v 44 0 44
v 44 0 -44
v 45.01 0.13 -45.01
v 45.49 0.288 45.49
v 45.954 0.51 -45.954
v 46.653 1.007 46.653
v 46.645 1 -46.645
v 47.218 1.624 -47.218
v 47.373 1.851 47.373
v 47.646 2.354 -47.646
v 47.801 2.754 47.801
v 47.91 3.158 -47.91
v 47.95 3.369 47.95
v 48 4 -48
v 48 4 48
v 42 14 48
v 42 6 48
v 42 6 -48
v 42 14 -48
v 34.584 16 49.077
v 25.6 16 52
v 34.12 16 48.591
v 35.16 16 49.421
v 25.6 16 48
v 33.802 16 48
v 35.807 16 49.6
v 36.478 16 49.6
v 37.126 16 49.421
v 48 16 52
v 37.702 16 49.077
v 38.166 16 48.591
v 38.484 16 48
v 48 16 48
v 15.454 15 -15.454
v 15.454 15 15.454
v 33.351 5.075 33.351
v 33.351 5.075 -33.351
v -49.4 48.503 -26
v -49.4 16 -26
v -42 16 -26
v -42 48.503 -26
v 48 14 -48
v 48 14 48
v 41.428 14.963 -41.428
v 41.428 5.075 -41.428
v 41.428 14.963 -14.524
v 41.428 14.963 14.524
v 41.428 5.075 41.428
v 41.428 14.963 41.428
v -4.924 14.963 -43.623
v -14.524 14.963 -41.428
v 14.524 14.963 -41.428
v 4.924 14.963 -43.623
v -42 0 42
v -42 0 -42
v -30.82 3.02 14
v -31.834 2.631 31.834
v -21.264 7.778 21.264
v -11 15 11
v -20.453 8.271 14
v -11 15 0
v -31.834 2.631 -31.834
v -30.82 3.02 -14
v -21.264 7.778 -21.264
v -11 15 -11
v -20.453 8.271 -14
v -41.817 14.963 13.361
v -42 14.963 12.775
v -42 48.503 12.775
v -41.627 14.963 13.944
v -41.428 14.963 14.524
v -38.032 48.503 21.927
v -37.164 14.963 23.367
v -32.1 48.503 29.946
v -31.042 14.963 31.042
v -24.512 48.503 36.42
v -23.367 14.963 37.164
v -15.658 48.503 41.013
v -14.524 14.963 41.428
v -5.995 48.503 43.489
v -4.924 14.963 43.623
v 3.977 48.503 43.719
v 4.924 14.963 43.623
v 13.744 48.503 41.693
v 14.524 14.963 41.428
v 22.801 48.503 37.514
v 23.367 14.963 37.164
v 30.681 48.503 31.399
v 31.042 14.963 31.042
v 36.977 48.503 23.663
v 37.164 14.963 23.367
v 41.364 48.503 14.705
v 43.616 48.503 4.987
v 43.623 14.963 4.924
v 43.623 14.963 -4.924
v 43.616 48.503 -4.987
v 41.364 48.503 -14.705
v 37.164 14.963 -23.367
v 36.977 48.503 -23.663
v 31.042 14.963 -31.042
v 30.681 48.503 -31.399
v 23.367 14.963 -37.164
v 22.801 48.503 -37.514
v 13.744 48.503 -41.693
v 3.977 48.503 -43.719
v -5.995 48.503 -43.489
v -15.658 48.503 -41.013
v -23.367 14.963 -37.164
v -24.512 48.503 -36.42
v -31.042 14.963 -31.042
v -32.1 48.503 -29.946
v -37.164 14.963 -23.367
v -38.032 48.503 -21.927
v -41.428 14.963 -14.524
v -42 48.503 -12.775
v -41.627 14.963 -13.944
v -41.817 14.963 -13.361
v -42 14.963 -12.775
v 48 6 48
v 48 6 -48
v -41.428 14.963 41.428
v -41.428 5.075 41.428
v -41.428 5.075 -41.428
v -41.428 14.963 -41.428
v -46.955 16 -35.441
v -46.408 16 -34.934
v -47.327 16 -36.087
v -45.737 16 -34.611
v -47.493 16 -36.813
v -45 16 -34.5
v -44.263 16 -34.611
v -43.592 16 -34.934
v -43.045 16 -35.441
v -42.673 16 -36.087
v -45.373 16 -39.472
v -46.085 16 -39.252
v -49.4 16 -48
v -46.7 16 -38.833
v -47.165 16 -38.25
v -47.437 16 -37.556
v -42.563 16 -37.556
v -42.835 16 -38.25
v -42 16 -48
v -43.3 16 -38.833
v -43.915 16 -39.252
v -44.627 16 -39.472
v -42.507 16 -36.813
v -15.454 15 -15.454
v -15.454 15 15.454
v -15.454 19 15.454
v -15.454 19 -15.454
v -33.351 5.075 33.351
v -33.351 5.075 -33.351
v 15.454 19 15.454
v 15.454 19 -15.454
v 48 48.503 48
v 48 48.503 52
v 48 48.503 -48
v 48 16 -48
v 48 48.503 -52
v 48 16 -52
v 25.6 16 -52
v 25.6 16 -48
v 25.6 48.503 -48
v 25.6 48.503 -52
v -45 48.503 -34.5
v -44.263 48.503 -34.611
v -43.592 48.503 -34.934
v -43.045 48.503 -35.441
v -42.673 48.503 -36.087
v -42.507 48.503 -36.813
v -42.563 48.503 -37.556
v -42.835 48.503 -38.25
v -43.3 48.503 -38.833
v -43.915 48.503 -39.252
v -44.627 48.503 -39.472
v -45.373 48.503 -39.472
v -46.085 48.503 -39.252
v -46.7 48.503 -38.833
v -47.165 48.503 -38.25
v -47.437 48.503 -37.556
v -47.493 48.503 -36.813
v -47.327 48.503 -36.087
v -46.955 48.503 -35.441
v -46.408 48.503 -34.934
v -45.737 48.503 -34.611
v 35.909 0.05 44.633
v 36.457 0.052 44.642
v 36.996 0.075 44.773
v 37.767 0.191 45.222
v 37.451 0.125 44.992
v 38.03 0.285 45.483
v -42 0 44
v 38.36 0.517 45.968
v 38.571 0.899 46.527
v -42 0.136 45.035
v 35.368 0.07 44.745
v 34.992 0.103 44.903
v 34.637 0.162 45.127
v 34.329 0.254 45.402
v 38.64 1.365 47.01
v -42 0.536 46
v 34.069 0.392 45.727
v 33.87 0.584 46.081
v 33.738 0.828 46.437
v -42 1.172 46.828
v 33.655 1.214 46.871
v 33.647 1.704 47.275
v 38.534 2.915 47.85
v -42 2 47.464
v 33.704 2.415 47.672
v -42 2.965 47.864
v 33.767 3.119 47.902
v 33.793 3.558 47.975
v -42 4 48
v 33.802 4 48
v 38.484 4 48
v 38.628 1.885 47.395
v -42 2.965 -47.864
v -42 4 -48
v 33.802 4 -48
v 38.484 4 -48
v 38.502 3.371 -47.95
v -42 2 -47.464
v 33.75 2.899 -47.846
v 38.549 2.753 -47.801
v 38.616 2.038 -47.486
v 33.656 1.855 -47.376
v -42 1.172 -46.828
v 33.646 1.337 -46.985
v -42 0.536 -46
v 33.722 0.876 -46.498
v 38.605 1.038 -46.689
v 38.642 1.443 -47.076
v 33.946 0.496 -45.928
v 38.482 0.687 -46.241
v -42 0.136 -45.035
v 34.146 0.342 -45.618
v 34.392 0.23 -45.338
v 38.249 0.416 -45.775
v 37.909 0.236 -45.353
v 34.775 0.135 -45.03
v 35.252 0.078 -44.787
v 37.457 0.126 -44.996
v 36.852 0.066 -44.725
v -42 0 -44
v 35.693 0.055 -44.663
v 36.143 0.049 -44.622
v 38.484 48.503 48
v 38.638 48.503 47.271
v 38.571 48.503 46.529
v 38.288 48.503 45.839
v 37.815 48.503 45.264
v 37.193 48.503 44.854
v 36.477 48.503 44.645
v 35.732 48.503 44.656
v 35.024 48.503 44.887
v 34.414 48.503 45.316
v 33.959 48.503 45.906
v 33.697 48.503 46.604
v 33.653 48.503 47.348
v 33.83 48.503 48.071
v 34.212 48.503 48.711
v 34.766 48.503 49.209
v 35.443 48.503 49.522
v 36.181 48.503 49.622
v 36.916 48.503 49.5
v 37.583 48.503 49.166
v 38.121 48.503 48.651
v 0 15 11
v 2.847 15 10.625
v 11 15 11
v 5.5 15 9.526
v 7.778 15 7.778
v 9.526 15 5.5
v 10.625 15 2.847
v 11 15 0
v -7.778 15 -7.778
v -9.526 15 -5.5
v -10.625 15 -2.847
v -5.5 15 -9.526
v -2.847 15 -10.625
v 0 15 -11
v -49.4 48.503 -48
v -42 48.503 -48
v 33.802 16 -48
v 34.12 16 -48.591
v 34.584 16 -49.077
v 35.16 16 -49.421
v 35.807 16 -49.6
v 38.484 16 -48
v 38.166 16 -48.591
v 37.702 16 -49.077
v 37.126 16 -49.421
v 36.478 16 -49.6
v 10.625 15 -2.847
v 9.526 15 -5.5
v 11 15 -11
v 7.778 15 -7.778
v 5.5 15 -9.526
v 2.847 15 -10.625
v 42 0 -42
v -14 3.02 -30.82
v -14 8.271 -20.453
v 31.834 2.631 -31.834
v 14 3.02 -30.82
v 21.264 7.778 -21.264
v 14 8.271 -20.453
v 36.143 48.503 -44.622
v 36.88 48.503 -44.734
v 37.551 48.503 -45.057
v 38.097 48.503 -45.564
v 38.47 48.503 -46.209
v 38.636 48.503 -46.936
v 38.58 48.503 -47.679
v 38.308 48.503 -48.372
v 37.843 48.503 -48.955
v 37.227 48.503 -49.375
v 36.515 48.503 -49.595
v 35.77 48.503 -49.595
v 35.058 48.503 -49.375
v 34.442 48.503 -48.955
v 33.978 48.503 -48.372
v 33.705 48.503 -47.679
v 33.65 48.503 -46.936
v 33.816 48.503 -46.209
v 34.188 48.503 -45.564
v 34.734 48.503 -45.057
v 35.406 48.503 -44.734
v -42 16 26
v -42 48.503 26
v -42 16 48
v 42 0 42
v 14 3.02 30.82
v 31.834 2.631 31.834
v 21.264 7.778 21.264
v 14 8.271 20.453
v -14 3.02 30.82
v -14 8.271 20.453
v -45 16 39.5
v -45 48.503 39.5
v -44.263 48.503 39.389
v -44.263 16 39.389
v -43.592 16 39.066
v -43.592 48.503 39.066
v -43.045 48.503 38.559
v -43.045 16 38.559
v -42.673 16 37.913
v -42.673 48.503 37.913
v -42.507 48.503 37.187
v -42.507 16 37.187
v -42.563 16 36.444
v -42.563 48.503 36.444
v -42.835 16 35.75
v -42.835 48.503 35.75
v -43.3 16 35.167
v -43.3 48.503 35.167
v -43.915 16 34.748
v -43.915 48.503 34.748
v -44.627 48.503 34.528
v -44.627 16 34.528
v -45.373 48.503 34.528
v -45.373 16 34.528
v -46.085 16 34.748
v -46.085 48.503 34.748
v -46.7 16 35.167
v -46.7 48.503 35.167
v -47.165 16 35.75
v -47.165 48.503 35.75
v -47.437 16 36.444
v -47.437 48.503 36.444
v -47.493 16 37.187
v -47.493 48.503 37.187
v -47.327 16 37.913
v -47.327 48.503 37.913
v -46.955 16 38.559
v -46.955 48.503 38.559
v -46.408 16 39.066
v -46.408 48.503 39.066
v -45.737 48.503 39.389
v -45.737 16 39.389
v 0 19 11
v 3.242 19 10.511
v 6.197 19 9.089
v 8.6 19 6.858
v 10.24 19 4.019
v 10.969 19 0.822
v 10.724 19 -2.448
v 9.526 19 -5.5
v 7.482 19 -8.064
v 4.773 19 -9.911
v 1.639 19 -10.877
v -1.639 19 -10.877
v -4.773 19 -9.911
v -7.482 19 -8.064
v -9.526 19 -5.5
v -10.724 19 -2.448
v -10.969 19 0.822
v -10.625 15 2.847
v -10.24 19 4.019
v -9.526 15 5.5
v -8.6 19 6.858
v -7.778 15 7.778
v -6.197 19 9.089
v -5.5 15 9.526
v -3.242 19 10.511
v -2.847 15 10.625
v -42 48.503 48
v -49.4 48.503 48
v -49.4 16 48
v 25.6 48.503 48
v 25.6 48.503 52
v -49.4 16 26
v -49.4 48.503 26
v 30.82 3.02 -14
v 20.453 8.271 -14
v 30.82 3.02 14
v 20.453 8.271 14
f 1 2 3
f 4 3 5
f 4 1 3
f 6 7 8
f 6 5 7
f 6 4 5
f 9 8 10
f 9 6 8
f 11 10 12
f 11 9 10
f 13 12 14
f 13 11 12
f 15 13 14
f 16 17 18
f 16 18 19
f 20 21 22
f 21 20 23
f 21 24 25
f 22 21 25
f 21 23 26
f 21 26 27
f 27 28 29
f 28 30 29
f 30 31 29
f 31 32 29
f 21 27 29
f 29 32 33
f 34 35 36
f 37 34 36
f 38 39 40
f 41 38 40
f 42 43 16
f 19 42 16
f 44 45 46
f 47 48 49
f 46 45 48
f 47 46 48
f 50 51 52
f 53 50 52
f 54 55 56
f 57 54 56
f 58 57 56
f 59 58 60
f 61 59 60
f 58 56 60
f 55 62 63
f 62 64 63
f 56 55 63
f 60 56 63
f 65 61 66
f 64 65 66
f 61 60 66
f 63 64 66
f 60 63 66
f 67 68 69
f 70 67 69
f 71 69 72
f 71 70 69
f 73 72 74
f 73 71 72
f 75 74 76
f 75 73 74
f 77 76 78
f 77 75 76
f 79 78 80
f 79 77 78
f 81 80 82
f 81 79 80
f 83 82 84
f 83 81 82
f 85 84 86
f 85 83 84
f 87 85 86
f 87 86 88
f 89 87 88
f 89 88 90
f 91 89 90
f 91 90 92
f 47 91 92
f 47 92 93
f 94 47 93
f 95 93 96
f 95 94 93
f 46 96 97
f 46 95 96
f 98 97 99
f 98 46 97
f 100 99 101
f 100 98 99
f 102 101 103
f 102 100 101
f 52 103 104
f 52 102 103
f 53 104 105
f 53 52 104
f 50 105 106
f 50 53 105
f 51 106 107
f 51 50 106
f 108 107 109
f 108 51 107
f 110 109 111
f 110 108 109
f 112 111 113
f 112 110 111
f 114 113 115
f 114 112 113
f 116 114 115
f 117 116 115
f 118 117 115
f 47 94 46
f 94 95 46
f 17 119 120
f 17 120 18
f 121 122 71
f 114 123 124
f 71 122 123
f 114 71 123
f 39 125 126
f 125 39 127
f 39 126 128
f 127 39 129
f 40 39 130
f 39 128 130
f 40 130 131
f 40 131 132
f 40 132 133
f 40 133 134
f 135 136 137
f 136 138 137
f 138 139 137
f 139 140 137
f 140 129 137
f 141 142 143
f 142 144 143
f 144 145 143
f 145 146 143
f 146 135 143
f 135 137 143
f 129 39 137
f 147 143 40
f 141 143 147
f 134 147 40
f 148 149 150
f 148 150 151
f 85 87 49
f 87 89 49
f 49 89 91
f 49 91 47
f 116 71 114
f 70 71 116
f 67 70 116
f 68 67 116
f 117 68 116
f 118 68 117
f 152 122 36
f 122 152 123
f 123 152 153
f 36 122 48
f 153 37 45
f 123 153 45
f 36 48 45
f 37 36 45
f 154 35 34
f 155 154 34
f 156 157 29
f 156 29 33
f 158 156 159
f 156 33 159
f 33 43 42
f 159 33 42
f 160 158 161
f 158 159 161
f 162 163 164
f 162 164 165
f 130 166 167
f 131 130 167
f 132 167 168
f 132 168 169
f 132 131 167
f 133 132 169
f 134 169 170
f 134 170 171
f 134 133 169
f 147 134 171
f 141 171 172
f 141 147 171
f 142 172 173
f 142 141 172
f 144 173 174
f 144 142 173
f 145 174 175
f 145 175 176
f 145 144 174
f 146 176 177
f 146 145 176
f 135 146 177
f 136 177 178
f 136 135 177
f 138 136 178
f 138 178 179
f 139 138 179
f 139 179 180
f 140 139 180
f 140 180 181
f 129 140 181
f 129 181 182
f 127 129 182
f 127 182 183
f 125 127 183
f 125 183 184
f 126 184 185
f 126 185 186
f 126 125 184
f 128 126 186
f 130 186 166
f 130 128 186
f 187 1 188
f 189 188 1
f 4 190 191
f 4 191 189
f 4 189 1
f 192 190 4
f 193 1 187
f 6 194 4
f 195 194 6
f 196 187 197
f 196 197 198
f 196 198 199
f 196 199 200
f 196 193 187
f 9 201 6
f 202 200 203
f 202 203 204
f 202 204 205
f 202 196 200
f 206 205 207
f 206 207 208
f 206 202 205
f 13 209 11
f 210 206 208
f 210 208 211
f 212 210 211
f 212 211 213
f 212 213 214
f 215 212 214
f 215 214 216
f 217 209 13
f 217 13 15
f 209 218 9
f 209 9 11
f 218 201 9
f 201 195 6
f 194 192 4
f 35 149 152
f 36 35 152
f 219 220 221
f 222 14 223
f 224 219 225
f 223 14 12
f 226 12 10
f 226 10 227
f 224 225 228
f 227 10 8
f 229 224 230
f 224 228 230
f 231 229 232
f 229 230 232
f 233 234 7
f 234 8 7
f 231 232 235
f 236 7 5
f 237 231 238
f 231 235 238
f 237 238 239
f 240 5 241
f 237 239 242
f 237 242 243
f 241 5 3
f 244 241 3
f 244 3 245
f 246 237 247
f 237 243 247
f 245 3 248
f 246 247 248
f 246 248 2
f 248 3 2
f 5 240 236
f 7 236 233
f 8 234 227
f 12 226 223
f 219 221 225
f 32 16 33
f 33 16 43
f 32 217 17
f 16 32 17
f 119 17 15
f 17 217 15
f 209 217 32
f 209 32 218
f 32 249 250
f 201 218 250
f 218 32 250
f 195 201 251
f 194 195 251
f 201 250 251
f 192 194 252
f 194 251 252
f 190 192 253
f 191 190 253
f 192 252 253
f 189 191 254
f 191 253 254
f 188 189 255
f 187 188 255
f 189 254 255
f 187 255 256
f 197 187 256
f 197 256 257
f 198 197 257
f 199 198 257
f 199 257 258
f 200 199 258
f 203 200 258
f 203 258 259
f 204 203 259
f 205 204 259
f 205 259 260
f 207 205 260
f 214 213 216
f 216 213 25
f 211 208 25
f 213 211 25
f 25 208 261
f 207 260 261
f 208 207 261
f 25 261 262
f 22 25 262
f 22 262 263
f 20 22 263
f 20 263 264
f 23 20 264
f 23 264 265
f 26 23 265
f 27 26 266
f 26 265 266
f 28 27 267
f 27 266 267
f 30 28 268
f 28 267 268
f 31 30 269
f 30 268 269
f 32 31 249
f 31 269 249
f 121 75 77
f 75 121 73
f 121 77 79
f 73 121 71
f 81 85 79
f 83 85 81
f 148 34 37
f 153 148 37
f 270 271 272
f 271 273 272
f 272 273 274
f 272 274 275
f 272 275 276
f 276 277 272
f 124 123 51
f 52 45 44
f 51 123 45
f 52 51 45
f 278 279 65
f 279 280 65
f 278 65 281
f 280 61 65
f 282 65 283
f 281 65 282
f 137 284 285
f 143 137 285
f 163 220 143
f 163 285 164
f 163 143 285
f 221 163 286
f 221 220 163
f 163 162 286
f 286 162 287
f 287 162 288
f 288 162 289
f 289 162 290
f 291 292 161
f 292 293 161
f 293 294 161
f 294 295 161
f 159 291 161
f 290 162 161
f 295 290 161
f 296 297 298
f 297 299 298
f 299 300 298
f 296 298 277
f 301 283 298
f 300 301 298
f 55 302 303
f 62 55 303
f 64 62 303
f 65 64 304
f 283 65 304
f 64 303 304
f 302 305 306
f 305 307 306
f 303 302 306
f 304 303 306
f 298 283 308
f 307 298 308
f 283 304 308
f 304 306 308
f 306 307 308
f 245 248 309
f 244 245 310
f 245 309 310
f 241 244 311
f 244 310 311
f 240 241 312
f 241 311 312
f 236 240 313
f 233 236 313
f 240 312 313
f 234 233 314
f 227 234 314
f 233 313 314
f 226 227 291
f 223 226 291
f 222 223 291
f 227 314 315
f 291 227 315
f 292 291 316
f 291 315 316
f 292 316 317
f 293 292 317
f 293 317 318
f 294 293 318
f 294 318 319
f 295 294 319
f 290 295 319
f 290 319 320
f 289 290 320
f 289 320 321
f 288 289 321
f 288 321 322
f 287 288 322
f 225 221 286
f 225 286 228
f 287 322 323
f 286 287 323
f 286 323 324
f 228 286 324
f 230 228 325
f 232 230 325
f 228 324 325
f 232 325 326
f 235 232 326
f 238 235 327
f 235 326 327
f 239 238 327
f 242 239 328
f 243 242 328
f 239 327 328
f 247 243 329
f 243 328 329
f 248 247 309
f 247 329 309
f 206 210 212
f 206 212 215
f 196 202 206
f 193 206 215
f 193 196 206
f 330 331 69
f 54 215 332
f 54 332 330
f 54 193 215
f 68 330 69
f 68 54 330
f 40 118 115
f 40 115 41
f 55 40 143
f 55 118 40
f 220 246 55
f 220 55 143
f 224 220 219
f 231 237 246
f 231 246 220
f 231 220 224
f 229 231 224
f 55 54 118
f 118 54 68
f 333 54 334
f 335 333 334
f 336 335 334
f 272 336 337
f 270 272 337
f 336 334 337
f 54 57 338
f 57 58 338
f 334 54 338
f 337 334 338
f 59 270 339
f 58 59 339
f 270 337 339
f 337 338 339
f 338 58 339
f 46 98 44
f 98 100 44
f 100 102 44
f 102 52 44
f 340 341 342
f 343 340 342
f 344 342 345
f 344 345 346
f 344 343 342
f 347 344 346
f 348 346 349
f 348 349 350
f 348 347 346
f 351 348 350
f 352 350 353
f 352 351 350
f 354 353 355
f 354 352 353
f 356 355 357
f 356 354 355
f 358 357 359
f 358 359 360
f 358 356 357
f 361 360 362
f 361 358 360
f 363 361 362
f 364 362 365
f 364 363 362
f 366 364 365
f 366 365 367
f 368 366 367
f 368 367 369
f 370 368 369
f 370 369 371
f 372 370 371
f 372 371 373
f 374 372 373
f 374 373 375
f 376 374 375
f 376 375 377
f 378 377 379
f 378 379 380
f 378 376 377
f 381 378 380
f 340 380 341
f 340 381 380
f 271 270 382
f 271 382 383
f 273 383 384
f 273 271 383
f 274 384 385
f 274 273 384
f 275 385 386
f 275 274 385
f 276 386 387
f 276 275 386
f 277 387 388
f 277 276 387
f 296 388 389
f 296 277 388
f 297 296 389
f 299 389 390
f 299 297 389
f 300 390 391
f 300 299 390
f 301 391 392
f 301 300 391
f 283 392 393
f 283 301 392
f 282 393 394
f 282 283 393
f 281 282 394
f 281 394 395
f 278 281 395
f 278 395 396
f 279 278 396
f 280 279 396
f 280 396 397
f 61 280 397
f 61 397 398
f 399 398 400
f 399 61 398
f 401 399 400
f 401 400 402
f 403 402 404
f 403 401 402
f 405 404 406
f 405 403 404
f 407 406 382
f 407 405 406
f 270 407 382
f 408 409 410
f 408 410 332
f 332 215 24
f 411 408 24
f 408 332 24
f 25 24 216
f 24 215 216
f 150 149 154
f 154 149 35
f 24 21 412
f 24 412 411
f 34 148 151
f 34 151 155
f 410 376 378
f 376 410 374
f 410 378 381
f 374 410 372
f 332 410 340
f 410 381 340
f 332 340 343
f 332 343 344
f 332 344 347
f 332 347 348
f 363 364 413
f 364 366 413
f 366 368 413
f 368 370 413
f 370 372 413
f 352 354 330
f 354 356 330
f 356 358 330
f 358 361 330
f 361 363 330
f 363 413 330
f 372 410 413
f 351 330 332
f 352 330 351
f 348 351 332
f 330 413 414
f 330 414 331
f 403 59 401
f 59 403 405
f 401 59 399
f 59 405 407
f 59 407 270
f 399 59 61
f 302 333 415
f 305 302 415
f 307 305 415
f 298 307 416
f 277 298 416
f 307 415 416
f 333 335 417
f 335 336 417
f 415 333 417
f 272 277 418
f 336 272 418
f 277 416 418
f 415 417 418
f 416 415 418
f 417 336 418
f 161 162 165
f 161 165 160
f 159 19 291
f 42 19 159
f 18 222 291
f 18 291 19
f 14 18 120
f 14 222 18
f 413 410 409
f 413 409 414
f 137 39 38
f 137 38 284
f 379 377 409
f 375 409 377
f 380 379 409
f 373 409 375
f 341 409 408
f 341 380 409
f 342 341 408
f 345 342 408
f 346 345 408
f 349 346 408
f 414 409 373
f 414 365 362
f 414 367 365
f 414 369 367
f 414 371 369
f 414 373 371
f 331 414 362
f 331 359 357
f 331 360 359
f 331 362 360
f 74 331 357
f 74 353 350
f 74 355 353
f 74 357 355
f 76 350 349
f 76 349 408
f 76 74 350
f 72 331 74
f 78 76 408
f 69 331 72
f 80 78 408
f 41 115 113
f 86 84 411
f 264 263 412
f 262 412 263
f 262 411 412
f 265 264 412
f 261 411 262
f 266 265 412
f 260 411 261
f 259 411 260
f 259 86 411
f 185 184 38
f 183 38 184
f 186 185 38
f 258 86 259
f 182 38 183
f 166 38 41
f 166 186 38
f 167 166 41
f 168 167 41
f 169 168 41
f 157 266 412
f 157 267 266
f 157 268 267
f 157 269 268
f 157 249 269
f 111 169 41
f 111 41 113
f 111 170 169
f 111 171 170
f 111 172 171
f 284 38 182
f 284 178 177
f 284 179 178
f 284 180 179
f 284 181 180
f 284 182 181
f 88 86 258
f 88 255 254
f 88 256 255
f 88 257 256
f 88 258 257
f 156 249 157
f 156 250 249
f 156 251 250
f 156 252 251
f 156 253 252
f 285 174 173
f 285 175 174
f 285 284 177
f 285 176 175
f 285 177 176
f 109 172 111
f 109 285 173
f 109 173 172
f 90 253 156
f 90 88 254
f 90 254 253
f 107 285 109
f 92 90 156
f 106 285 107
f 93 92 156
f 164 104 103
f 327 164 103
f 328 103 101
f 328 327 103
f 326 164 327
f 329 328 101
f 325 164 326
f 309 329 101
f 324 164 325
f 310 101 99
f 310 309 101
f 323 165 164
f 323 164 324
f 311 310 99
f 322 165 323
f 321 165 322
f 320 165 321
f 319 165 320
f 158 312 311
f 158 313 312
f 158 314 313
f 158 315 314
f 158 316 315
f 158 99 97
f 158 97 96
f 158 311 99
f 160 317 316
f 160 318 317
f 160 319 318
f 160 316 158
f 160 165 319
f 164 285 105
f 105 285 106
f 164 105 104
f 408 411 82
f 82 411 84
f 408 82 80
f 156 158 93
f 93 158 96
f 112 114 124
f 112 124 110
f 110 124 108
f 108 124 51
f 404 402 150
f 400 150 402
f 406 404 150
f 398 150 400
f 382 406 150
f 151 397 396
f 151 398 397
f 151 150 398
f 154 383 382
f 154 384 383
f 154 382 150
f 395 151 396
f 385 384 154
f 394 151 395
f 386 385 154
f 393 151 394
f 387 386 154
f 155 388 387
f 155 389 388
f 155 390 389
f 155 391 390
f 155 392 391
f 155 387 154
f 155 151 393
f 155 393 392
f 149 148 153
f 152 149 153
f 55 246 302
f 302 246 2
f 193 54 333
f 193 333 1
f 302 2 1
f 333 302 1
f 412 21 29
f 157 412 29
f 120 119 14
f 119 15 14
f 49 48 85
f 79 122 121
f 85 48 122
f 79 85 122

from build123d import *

# Parameters (mm, degrees)
SKETCH_8_W               = 96
SKETCH_8_H               = 96
SKETCH_8_R               = 43.9
EXTRUDE_1_DEPTH          = 33.54
CUT_EXTRUDE_3_DEPTH      = 84.429752707
CUT_EXTRUDE_3_DEPTH_BACK = 8.53
SKETCH_14_W              = 6
SKETCH_14_H              = 96
EXTRUDE_3_DEPTH          = 18.502821
EXTRUDE_3_DEPTH_BACK     = 14
SKETCH_16_W              = 22.4
SKETCH_16_H              = 4
SKETCH_16_W_2            = 7.4
SKETCH_16_H_2            = 22
SKETCH_16_R              = 2.5
FILLET_5_R               = 4
SKETCH_21_W              = 30.907014898
SKETCH_21_H              = 30.907014898
SKETCH_21_R              = 11
EXTRUDE_4_DEPTH          = 4
SKETCH_22_R              = 2.5
CUT_EXTRUDE_4_DEPTH      = 87.584546233
CUT_EXTRUDE_5_DEPTH      = 125.935517954
CUT_EXTRUDE_5_DEPTH_BACK = 125.935517954
SKETCH_23_W              = 6
SKETCH_23_H              = 8


with BuildPart() as part:
    # 掃出1: sweep along a path in 草圖6
    with BuildLine(Plane(origin=(0, 0, 0), x_dir=(1, 0, 0), z_dir=(0, 1, 0))) as sweep_1_path:
        Line((-42, 42), (42, 42))
        Line((42, 42), (42, -42))
        Line((42, -42), (-42, -42))
        Line((-42, -42), (-42, 42))
    # 草圖7 → 掃出1 (sweep)
    with BuildSketch(Plane.XY):
        with BuildLine():
            Line((-48, 0), (-48, 14.962820915))
            Line((-48, 14.962820915), (-41.427728365, 14.962820915))
            Line((-41.427728365, 14.962820915), (-41.427728365, 5.074548504))
            Line((-41.427728365, 5.074548504), (-33.350791498, 5.074548504))
            Line((-33.350791498, 5.074548504), (-15.453507449, 15))
            Line((-15.453507449, 15), (-11, 15))
            add(Edge.make_bspline(
                [(-11, 15), (-19.96241049, 7.783643124), (-30.446618789, 1.65287244), (-42, 0)],
                knots=[0, 0, 0, 0, 1, 1, 1, 1], degree=3))
            Line((-42, 0), (-48, 0))
        make_face()
    sweep(path=sweep_1_path.line, transition=Transition.RIGHT)

    # 草圖8 → 填料-伸長1 (add)
    with BuildSketch(Plane(origin=(0, 14.962820915, 0), x_dir=(1, 0, 0), z_dir=(0, 1, 0))):
        Rectangle(SKETCH_8_W, SKETCH_8_H)
        with Locations(Location((0, 0, 0), (0, 0, 70.679739301))):
            Circle(SKETCH_8_R, mode=Mode.SUBTRACT)
    extrude(amount=EXTRUDE_1_DEPTH)

    # 草圖14 → 除料-伸長3 (cut, two sides: drawn at the far end of the back side and taken through both)
    with BuildSketch(Plane(origin=(0, 0, 0), x_dir=(1, 0, 0), z_dir=(0, 1, 0)).offset(-CUT_EXTRUDE_3_DEPTH_BACK)):
        with Locations((-45, 0)):
            Rectangle(SKETCH_14_W, SKETCH_14_H)
    extrude(amount=CUT_EXTRUDE_3_DEPTH + CUT_EXTRUDE_3_DEPTH_BACK, mode=Mode.SUBTRACT)

    # 草圖16 → 填料-伸長3 (add, two sides: drawn at the far end of the back side and taken through both)
    # profile 1 of 4: a face of its own
    with BuildSketch(Plane(origin=(0, 30, 0), x_dir=(1, 0, 0), z_dir=(0, 1, 0)).offset(-EXTRUDE_3_DEPTH_BACK)):
        with Locations((36.8, 50)):
            Rectangle(SKETCH_16_W, SKETCH_16_H)
    # profile 2 of 4: a face of its own
    with BuildSketch(Plane(origin=(0, 30, 0), x_dir=(1, 0, 0), z_dir=(0, 1, 0)).offset(-EXTRUDE_3_DEPTH_BACK)):
        with Locations((36.8, -50)):
            Rectangle(SKETCH_16_W, SKETCH_16_H)
    # profile 3 of 4: a face of its own
    with BuildSketch(Plane(origin=(0, 30, 0), x_dir=(1, 0, 0), z_dir=(0, 1, 0)).offset(-EXTRUDE_3_DEPTH_BACK)):
        with Locations((-45.7, -37)):
            Rectangle(SKETCH_16_W_2, SKETCH_16_H_2)
        with Locations(Location((-45, -37, 0), (0, 0, 270))):
            Circle(SKETCH_16_R, mode=Mode.SUBTRACT)
    # profile 4 of 4: a face of its own
    with BuildSketch(Plane(origin=(0, 30, 0), x_dir=(1, 0, 0), z_dir=(0, 1, 0)).offset(-EXTRUDE_3_DEPTH_BACK)):
        with Locations((-45.7, 37)):
            Rectangle(SKETCH_16_W_2, SKETCH_16_H_2)
        with Locations(Location((-45, 37, 0), (0, 0, 270))):
            Circle(SKETCH_16_R, mode=Mode.SUBTRACT)
    extrude(amount=EXTRUDE_3_DEPTH + EXTRUDE_3_DEPTH_BACK)

    # 圓角5
    fillet_5_edges = [part.edges().sort_by_distance(p)[0] for p in [
        (3, 0, -48),
        (48, 0, 0),
        (3, 0, 48),
    ]]
    fillet(fillet_5_edges, radius=FILLET_5_R)

    # 草圖21 → 填料-伸長4 (add)
    with BuildSketch(Plane(origin=(0, 15, 0), x_dir=(1, 0, 0), z_dir=(0, 1, 0))):
        Rectangle(SKETCH_21_W, SKETCH_21_H)
        with Locations(Location((0, 0, 0), (0, 0, 270))):
            Circle(SKETCH_21_R, mode=Mode.SUBTRACT)
    extrude(amount=EXTRUDE_4_DEPTH)

    # 草圖22 → 除料-伸長4 (cut, through all)
    with BuildSketch(Plane(origin=(0, 48.502820915, 0), x_dir=(1, 0, 0), z_dir=(0, 1, 0))):
        with Locations(Location((36.142689786, 47.122458141, 0), (0, 0, 270))):
            Circle(SKETCH_22_R)
        with Locations(Location((36.142689786, -47.122458141, 0), (0, 0, 339.450483695))):
            Circle(SKETCH_22_R)
    extrude(amount=-CUT_EXTRUDE_4_DEPTH, mode=Mode.SUBTRACT)

    # 草圖23 → 除料-伸長5 (cut, two sides: drawn at the far end of the back side and taken through both)
    with BuildSketch(Plane(origin=(0, 0, -52), x_dir=(-1, 0, 0), z_dir=(0, 0, -1)).offset(-CUT_EXTRUDE_5_DEPTH_BACK)):
        with Locations((-45, 10)):
            Rectangle(SKETCH_23_W, SKETCH_23_H)
    extrude(amount=CUT_EXTRUDE_5_DEPTH + CUT_EXTRUDE_5_DEPTH_BACK, mode=Mode.SUBTRACT)


solid = part.part
